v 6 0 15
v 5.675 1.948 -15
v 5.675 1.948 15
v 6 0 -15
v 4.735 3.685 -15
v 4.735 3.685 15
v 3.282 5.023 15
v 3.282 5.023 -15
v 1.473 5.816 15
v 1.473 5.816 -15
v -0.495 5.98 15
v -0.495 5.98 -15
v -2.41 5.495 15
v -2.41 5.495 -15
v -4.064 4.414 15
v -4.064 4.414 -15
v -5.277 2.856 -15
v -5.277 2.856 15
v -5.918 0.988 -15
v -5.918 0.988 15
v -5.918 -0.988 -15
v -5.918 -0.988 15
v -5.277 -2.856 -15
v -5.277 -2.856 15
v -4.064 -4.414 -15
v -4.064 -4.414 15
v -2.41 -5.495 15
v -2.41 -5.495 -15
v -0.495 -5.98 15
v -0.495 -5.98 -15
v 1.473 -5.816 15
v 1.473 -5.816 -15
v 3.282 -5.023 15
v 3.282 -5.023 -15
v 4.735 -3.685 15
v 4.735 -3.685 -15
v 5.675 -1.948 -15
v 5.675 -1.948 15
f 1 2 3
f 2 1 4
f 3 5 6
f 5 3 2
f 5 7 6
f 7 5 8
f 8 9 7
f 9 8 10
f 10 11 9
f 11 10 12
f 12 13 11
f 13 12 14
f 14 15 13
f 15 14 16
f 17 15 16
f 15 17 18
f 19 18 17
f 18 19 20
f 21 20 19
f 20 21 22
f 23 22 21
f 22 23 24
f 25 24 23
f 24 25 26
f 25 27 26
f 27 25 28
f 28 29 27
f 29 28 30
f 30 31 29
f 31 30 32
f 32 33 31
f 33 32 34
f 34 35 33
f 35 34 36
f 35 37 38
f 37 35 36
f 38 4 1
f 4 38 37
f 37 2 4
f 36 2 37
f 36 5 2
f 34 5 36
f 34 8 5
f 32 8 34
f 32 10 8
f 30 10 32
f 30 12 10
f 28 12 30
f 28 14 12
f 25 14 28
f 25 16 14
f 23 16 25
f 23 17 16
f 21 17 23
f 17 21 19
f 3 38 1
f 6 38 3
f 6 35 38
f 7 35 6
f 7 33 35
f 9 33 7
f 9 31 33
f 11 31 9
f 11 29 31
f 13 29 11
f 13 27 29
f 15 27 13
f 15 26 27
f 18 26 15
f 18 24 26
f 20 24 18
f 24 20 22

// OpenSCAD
// Volume: 3331.4160706583143, SurfaceArea: 1347.9213205532076
difference() {
  *sphere(r=10);
  cylinder(h=30, r=6, center=true);
}
*if (true) cube([25,6,3], center=true);
